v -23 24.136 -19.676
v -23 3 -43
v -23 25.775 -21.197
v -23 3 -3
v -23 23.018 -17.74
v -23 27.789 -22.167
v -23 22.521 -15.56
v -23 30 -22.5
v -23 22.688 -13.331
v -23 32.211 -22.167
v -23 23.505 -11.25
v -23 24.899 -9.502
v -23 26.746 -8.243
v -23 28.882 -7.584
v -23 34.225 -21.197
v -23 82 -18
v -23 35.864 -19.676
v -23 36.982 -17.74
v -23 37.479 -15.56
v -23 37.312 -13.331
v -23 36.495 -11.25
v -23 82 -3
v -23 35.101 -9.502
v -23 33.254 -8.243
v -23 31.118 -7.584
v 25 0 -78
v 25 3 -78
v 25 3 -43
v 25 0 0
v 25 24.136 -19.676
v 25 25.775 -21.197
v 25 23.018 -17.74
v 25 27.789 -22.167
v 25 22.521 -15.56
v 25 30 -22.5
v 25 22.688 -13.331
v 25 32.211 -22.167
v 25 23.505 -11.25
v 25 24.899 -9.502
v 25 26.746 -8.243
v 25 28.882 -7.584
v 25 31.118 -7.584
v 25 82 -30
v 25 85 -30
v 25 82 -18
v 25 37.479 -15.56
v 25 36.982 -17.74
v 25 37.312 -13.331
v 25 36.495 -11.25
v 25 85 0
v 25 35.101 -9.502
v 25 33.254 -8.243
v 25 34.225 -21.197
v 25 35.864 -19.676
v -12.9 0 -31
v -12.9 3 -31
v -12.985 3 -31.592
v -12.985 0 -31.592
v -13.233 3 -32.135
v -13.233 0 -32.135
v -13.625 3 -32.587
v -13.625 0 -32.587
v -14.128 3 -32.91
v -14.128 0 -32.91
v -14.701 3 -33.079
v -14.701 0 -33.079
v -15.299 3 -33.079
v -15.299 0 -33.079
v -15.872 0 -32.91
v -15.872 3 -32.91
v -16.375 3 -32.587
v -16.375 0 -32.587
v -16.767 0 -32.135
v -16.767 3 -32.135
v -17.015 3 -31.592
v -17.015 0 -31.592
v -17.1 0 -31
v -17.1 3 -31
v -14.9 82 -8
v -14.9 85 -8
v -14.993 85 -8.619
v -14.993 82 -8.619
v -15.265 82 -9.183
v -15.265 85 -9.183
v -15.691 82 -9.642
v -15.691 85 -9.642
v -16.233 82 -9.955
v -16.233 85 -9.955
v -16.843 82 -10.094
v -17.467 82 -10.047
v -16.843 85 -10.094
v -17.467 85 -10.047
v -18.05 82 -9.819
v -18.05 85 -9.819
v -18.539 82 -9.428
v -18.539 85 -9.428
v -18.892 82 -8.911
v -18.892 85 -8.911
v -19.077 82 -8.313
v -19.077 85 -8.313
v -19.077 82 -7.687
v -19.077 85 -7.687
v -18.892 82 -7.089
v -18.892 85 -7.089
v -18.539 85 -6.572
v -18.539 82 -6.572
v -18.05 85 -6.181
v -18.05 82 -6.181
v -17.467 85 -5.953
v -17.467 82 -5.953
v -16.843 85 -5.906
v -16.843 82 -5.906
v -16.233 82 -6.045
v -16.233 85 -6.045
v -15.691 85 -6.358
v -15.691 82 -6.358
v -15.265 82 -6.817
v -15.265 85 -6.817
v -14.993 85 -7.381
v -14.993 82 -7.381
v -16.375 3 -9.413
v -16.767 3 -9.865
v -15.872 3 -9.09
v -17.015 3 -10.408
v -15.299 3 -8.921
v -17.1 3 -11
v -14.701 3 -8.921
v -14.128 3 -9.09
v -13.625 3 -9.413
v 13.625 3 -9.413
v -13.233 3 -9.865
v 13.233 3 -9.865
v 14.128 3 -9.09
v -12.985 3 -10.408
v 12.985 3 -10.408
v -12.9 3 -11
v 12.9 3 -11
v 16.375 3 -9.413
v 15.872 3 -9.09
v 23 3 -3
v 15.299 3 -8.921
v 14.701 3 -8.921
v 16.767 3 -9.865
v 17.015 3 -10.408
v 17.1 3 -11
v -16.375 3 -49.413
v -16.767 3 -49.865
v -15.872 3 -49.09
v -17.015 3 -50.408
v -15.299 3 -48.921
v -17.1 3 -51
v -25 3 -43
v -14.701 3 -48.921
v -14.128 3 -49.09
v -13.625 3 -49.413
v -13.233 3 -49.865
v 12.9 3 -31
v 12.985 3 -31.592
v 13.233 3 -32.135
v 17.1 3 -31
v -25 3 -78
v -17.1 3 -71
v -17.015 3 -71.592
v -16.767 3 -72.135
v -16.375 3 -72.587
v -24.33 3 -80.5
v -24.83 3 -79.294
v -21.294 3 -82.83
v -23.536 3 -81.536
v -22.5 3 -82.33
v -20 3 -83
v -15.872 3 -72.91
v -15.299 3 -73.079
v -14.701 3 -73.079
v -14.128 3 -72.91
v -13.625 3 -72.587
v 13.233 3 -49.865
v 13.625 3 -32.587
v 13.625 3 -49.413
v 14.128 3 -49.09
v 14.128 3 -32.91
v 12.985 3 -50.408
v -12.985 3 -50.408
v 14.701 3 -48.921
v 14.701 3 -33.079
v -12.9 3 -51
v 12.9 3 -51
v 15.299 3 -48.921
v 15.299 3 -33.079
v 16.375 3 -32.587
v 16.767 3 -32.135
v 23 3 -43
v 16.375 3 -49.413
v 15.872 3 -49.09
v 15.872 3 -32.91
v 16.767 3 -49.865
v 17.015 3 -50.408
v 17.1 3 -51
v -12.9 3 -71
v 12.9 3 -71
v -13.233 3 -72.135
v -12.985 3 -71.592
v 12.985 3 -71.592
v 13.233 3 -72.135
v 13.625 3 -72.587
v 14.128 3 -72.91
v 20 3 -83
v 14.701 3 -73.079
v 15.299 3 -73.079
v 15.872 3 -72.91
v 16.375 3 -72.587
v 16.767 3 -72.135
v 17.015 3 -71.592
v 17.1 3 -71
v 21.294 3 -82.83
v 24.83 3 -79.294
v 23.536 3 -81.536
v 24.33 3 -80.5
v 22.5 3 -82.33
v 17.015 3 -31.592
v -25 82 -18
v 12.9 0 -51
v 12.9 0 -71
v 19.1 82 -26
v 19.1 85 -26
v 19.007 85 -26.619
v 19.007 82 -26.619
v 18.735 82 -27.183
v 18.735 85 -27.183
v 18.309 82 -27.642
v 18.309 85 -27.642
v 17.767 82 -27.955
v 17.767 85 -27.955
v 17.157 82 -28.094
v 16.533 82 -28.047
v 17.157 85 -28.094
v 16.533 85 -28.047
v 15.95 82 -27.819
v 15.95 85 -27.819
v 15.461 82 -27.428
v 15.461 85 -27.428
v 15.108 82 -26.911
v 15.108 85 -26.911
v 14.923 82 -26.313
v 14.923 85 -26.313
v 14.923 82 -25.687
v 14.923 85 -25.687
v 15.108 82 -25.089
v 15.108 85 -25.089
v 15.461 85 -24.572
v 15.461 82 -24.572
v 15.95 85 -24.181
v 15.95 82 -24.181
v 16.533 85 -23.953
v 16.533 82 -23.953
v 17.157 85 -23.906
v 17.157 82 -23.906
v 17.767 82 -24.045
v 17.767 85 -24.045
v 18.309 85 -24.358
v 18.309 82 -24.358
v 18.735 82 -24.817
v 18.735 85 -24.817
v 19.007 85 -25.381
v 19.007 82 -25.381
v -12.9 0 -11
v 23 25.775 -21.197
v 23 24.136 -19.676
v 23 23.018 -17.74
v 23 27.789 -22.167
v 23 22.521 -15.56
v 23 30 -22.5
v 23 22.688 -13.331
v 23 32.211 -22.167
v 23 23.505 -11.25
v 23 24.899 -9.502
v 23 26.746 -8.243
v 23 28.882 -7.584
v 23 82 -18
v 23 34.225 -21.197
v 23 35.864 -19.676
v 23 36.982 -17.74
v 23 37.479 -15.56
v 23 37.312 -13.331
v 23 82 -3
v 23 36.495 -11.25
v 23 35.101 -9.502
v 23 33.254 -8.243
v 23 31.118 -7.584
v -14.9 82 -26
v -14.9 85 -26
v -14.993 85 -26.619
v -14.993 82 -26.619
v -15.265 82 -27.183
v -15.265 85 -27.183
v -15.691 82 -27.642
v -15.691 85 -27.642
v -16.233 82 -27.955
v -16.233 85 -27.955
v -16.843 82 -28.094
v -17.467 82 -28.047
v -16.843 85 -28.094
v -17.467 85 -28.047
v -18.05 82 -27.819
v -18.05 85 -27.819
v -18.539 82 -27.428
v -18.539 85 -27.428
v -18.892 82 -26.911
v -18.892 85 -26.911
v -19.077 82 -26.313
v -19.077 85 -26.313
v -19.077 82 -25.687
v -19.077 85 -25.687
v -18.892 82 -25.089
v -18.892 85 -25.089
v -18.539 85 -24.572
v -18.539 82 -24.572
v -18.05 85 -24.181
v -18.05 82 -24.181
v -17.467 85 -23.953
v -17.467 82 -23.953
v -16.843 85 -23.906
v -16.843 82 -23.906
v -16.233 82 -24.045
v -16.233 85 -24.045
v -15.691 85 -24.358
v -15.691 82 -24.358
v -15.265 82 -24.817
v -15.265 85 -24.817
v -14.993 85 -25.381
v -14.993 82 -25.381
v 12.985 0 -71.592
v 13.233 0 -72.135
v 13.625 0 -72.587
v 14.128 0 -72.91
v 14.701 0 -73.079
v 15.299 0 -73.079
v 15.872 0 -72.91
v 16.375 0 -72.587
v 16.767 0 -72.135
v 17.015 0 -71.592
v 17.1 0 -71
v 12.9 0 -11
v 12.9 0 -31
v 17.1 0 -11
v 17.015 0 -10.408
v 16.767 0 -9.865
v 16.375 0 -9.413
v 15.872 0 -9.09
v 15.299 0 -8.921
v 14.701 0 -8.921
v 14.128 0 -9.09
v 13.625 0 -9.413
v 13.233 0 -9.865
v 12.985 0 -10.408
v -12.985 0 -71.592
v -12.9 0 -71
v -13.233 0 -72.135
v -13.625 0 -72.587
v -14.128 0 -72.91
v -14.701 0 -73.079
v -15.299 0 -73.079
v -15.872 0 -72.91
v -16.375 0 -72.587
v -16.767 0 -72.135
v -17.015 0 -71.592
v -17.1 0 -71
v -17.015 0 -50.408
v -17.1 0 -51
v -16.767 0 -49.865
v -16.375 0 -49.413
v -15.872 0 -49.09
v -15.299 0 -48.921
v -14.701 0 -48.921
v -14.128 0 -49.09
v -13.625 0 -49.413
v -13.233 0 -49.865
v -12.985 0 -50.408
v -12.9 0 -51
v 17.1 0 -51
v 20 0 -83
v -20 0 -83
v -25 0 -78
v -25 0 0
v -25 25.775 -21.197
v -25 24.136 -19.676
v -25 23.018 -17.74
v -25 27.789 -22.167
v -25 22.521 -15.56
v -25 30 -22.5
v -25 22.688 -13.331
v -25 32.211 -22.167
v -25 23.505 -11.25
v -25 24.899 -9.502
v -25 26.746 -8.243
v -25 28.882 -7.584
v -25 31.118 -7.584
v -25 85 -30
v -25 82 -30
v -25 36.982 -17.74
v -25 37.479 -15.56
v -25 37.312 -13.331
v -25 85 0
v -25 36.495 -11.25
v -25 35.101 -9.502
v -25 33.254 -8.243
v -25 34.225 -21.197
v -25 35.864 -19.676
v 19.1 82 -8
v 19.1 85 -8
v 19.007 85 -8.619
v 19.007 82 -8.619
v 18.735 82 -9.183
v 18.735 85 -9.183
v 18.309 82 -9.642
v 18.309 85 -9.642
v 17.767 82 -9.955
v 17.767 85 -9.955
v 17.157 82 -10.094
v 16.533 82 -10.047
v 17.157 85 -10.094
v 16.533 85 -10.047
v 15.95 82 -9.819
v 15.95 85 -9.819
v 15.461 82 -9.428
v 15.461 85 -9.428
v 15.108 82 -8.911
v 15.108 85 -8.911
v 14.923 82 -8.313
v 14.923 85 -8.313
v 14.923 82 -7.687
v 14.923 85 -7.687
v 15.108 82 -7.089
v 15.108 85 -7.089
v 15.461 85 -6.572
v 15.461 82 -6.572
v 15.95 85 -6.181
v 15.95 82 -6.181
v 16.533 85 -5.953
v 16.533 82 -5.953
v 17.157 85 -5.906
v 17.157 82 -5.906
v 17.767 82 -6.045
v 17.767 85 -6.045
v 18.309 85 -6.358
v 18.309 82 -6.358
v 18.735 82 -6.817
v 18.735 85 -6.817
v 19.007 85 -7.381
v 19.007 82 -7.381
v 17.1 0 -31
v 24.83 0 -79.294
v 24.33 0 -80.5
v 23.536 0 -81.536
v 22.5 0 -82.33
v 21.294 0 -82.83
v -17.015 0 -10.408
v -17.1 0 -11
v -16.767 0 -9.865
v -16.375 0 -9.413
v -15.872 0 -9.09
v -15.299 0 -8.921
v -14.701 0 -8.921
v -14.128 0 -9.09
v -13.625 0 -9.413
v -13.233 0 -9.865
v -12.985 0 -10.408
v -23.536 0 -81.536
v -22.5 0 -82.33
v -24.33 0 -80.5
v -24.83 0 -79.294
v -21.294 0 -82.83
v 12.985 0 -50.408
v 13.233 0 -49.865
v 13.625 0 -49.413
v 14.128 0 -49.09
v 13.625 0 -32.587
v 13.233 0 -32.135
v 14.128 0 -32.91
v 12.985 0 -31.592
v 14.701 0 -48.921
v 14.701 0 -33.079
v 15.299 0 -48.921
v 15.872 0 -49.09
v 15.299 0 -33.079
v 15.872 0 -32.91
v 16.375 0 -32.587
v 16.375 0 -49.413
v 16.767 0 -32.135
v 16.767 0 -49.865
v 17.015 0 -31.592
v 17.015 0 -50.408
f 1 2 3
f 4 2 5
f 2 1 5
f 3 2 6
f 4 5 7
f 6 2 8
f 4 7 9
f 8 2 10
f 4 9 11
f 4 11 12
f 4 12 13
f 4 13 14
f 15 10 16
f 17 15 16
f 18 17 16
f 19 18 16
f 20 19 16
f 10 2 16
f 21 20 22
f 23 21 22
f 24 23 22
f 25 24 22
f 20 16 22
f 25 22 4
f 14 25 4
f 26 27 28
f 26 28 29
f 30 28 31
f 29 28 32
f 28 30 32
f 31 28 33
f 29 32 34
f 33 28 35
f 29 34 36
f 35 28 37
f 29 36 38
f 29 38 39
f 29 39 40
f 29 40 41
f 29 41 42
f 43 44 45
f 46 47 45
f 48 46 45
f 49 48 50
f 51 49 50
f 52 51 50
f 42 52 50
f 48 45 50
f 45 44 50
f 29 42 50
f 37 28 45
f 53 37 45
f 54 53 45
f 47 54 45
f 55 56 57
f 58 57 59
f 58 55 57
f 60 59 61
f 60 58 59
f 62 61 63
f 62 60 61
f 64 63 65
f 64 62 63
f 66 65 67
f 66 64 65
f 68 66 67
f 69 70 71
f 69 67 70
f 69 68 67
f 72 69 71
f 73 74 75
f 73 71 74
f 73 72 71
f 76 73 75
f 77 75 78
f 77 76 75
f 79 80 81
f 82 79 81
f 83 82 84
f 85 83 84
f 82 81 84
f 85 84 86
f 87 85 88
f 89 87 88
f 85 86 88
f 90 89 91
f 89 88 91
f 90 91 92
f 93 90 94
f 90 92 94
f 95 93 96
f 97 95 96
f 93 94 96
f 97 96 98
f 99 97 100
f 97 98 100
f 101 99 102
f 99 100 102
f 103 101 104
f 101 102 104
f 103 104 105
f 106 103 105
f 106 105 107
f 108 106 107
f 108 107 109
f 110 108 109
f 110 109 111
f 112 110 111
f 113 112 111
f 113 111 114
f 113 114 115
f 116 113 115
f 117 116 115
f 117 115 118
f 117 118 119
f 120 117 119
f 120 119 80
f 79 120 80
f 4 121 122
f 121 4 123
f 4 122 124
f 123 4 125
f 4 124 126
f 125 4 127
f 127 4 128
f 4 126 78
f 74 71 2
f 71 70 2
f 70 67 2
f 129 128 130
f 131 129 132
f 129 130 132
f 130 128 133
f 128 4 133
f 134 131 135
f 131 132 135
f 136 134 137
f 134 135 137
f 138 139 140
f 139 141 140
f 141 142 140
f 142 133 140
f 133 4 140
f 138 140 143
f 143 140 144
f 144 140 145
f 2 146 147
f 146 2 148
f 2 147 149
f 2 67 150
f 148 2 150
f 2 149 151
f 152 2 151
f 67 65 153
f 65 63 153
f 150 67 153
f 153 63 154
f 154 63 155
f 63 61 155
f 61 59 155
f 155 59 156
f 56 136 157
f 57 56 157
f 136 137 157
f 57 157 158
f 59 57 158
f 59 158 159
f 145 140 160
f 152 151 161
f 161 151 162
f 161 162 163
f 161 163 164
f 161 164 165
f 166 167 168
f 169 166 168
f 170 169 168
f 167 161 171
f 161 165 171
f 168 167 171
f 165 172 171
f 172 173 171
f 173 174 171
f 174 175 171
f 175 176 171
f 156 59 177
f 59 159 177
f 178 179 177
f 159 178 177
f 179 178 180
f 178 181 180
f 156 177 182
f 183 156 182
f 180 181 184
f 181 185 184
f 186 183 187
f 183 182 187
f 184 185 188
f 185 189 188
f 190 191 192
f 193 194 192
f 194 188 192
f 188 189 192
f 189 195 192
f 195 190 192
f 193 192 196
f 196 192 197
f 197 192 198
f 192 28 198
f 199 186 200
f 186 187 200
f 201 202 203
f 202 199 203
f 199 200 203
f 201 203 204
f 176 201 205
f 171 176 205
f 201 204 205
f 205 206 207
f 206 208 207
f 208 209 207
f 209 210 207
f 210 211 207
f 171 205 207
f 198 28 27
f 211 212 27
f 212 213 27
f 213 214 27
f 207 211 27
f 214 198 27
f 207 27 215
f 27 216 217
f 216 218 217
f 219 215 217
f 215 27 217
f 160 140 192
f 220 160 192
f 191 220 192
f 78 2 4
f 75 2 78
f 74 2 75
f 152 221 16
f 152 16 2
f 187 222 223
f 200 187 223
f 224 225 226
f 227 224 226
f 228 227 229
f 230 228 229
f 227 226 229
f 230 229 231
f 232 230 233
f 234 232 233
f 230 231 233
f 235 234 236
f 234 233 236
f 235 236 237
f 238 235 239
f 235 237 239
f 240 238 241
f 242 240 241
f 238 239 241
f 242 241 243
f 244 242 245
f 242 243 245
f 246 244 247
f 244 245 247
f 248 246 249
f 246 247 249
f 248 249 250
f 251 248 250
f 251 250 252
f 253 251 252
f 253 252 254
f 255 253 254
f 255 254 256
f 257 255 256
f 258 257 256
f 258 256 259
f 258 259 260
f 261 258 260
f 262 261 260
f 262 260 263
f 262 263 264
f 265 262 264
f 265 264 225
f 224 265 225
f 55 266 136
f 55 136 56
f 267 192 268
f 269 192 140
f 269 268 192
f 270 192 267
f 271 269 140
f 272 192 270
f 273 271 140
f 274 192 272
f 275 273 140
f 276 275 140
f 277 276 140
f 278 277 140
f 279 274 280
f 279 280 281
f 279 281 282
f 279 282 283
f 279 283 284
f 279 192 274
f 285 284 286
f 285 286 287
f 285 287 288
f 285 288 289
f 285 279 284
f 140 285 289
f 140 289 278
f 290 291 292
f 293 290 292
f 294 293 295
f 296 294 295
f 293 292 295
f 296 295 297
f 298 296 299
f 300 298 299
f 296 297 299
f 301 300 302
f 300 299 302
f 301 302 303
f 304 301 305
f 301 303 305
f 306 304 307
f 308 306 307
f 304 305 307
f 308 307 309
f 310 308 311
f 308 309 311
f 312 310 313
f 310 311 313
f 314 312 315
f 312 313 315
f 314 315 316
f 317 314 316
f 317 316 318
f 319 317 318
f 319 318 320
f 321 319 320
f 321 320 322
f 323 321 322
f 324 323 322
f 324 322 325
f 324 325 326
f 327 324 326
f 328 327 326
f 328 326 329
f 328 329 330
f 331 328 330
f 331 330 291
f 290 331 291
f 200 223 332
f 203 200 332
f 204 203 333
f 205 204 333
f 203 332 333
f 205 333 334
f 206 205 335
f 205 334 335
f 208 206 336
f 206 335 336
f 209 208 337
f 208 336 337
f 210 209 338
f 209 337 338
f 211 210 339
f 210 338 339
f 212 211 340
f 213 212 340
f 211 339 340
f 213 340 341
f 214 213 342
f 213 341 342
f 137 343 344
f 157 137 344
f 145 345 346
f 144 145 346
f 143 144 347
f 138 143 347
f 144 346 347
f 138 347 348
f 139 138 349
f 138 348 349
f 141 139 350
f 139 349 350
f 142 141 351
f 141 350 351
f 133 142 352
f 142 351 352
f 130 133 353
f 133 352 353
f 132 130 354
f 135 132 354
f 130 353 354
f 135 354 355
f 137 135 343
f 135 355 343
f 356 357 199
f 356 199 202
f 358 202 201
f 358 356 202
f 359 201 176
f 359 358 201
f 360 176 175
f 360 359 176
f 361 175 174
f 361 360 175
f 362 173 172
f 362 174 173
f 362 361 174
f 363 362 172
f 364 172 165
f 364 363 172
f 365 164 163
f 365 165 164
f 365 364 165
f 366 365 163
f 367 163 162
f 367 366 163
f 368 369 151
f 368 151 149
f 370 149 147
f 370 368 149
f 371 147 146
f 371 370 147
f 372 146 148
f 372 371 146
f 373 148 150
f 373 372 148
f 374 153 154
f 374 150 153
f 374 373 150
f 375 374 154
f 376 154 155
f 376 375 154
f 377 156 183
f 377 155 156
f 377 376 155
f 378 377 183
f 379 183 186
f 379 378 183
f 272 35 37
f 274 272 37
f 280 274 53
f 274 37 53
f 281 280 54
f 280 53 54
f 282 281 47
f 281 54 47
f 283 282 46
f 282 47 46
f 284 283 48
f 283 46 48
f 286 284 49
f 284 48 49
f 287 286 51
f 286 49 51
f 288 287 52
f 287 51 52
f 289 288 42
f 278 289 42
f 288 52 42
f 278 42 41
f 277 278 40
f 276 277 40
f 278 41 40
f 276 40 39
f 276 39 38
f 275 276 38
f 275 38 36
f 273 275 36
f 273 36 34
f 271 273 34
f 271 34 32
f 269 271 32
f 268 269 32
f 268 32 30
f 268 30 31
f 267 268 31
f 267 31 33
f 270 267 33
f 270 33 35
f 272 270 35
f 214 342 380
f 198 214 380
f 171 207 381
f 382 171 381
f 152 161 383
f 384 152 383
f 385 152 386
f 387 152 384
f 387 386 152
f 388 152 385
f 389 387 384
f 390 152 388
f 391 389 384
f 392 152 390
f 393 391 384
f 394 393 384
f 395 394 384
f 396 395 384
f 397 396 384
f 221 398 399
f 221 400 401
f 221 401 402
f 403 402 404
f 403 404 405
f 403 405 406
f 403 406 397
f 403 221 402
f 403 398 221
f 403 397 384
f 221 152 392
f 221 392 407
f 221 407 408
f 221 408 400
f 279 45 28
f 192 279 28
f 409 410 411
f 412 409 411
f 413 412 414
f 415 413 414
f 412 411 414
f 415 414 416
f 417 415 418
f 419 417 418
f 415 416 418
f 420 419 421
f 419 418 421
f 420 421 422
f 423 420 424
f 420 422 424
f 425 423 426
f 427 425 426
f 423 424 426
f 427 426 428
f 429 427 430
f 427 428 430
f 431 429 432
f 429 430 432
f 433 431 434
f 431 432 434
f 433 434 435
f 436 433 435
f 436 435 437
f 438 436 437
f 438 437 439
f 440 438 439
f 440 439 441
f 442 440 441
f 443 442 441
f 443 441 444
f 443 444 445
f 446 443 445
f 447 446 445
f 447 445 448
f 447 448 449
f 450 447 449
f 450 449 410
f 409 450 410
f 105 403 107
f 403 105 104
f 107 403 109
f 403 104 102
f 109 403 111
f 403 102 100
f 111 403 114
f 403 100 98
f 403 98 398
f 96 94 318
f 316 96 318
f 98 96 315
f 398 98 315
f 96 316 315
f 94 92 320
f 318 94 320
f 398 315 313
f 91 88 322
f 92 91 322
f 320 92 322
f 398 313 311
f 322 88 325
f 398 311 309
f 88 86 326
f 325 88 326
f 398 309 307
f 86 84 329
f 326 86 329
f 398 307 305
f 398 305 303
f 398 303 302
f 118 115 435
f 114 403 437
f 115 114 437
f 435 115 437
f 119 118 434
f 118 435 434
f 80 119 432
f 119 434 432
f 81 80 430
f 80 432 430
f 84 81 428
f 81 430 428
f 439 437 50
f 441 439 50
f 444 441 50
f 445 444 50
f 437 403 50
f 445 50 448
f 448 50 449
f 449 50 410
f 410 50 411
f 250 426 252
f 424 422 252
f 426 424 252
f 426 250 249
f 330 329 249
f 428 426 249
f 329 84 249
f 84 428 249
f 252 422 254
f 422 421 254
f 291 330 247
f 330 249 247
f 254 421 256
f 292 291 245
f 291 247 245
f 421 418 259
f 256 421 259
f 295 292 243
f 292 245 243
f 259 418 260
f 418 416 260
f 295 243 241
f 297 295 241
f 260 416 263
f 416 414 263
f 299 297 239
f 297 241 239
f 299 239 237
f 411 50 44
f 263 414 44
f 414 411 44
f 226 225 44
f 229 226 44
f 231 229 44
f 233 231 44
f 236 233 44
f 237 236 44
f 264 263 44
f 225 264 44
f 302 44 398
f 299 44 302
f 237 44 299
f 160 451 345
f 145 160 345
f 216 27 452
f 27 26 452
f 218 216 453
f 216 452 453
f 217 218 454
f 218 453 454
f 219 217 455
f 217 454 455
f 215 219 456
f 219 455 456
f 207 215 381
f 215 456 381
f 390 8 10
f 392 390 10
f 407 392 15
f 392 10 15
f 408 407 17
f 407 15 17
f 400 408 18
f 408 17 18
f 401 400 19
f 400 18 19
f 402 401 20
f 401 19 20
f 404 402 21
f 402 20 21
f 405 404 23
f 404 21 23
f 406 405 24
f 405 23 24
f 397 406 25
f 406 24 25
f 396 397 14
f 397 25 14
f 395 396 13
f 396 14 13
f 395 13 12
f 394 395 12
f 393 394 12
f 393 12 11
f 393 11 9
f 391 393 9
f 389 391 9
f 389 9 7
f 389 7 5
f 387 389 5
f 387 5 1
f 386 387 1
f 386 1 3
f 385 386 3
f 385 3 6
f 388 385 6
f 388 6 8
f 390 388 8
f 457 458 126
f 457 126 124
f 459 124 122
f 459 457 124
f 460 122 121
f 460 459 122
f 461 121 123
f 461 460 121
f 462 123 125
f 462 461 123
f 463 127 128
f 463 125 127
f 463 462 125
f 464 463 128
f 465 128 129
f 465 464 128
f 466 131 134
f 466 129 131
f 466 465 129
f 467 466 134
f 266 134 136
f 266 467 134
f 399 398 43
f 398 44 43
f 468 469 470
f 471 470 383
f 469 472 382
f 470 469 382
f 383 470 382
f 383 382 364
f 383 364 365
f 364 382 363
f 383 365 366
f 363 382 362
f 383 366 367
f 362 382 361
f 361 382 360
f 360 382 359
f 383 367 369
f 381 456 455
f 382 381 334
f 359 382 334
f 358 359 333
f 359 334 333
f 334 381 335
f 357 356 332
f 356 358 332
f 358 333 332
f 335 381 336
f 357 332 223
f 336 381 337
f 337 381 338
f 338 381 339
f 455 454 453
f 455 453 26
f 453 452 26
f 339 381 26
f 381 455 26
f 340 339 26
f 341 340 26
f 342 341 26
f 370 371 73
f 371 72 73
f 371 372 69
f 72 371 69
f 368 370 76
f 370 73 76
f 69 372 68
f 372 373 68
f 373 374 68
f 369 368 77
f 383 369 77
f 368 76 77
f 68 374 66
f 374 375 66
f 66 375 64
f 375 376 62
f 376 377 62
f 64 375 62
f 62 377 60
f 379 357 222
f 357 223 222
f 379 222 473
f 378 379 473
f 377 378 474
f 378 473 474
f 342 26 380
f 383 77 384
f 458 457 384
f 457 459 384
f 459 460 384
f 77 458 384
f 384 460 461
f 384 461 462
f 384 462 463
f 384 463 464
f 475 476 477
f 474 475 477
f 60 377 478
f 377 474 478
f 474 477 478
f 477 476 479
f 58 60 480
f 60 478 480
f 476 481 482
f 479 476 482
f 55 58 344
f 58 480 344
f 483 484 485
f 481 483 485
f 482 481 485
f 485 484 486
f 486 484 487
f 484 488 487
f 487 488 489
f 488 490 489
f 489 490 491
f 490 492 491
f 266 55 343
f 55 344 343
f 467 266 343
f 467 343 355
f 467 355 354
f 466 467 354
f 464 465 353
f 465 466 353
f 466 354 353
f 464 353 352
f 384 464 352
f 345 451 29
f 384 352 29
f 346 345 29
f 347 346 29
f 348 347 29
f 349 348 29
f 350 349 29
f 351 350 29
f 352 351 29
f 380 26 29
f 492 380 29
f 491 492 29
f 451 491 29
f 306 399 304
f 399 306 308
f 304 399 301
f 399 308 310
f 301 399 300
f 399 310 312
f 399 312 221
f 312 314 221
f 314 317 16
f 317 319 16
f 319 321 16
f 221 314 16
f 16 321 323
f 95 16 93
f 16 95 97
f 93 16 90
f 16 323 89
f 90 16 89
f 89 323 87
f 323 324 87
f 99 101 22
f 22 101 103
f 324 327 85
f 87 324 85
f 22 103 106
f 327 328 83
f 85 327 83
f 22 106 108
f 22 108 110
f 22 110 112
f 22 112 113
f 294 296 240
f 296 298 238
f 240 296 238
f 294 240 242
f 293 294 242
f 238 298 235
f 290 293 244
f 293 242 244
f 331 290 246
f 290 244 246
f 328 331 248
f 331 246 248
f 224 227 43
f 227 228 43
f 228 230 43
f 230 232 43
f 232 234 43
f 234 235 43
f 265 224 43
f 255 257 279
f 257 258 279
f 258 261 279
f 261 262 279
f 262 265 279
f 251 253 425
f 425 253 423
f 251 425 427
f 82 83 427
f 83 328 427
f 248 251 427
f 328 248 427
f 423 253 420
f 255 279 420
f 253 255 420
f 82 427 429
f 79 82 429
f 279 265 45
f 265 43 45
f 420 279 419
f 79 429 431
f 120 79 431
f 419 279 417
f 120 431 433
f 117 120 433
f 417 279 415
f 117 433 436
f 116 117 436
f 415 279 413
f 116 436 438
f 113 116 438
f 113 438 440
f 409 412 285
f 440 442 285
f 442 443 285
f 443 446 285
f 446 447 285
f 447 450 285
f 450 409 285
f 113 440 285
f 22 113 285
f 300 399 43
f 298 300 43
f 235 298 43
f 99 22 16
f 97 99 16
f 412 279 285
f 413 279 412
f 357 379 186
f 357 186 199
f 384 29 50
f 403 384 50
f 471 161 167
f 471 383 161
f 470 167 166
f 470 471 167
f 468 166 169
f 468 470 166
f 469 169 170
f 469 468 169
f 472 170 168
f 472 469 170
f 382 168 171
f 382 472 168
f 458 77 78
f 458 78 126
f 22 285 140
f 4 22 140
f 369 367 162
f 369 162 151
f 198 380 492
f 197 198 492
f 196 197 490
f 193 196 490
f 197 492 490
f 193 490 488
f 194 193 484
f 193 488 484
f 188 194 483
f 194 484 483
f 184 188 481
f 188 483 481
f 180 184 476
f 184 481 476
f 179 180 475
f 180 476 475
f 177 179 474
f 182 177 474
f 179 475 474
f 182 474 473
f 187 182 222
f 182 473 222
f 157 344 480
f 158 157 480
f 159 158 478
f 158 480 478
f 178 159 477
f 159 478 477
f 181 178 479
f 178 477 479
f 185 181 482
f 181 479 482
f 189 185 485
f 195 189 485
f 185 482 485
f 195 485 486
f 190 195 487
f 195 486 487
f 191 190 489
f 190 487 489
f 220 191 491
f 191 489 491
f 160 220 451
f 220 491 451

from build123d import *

# Parameters (mm, degrees)
EXTRUDE_1_DEPTH     = 25
EXTRUDE_2_DEPTH     = 2
CUT_EXTRUDE_1_REACH = 87
SKETCH_4_R          = 2.1
CUT_EXTRUDE_2_REACH = 87
FILLET_1_R          = 5
EXTRUDE_3_DEPTH     = 2
SKETCH_7_R          = 7.5
CUT_EXTRUDE_3_DEPTH = 51


with BuildPart() as part:
    # 草图1 → 凸台-拉伸1 (new body, symmetric)
    with BuildSketch(Plane(origin=(0, 0, 0), x_dir=(0, 0, -1), z_dir=(1, 0, 0))):
        Polygon((0, 0), (0, 85), (30, 85), (30, 82), (3, 82), (3, 3), (83, 3), (83, 0), align=None)
    extrude(amount=EXTRUDE_1_DEPTH, both=True)

    # 草图2 → 凸台-拉伸2 (add)
    with BuildSketch(Plane(origin=(25, 0, 0), x_dir=(0, 0, -1), z_dir=(1, 0, 0))):
        Polygon((43, 3), (3, 3), (3, 82), (18, 82), align=None)
    extrude(amount=-EXTRUDE_2_DEPTH)

    # 草图4 → 切除-拉伸1 (cut, up to next)
    with BuildSketch(Plane(origin=(0, 85, 0), x_dir=(1, 0, 0), z_dir=(0, 1, 0)), mode=Mode.PRIVATE) as cut_extrude_1_sk1:
        with Locations((-17, 26)):
            Circle(SKETCH_4_R)
    cut_extrude_1_tool1 = extrude(cut_extrude_1_sk1.sketch, amount=-CUT_EXTRUDE_1_REACH, mode=Mode.PRIVATE) & part.part
    add(cut_extrude_1_tool1.solids().sort_by_distance((-17, 85, -26))[0], mode=Mode.SUBTRACT)
    # 草图4 → 切除-拉伸1 (cut, up to next)
    with BuildSketch(Plane(origin=(0, 85, 0), x_dir=(1, 0, 0), z_dir=(0, 1, 0)), mode=Mode.PRIVATE) as cut_extrude_1_sk2:
        with Locations((-17, 8)):
            Circle(SKETCH_4_R)
    cut_extrude_1_tool2 = extrude(cut_extrude_1_sk2.sketch, amount=-CUT_EXTRUDE_1_REACH, mode=Mode.PRIVATE) & part.part
    add(cut_extrude_1_tool2.solids().sort_by_distance((-17, 85, -8))[0], mode=Mode.SUBTRACT)
    # 草图4 → 切除-拉伸1 (cut, up to next)
    with BuildSketch(Plane(origin=(0, 85, 0), x_dir=(1, 0, 0), z_dir=(0, 1, 0)), mode=Mode.PRIVATE) as cut_extrude_1_sk3:
        with Locations((17, 8)):
            Circle(SKETCH_4_R)
    cut_extrude_1_tool3 = extrude(cut_extrude_1_sk3.sketch, amount=-CUT_EXTRUDE_1_REACH, mode=Mode.PRIVATE) & part.part
    add(cut_extrude_1_tool3.solids().sort_by_distance((17, 85, -8))[0], mode=Mode.SUBTRACT)
    # 草图4 → 切除-拉伸1 (cut, up to next)
    with BuildSketch(Plane(origin=(0, 85, 0), x_dir=(1, 0, 0), z_dir=(0, 1, 0)), mode=Mode.PRIVATE) as cut_extrude_1_sk4:
        with Locations((17, 26)):
            Circle(SKETCH_4_R)
    cut_extrude_1_tool4 = extrude(cut_extrude_1_sk4.sketch, amount=-CUT_EXTRUDE_1_REACH, mode=Mode.PRIVATE) & part.part
    add(cut_extrude_1_tool4.solids().sort_by_distance((17, 85, -26))[0], mode=Mode.SUBTRACT)

    # 草图5 → 切除-拉伸2 (cut, up to next)
    with BuildSketch(Plane.XZ, mode=Mode.PRIVATE) as cut_extrude_2_sk1:
        with BuildLine():
            Line((-12.9, -11), (-12.9, -31))
            ThreePointArc((-12.9, -31), (-15, -33.1), (-17.1, -31))
            Line((-17.1, -31), (-17.1, -11))
            ThreePointArc((-17.1, -11), (-15, -8.9), (-12.9, -11))
        make_face()
    cut_extrude_2_tool1 = extrude(cut_extrude_2_sk1.sketch, amount=-CUT_EXTRUDE_2_REACH, mode=Mode.PRIVATE) & part.part
    add(cut_extrude_2_tool1.solids().sort_by_distance((-15, 0, -21))[0], mode=Mode.SUBTRACT)
    # 草图5 → 切除-拉伸2 (cut, up to next)
    with BuildSketch(Plane.XZ, mode=Mode.PRIVATE) as cut_extrude_2_sk2:
        with BuildLine():
            Line((-12.9, -51), (-12.9, -71))
            ThreePointArc((-12.9, -71), (-15, -73.1), (-17.1, -71))
            Line((-17.1, -71), (-17.1, -51))
            ThreePointArc((-17.1, -51), (-15, -48.9), (-12.9, -51))
        make_face()
    cut_extrude_2_tool2 = extrude(cut_extrude_2_sk2.sketch, amount=-CUT_EXTRUDE_2_REACH, mode=Mode.PRIVATE) & part.part
    add(cut_extrude_2_tool2.solids().sort_by_distance((-15, 0, -61))[0], mode=Mode.SUBTRACT)
    # 草图5 → 切除-拉伸2 (cut, up to next)
    with BuildSketch(Plane.XZ, mode=Mode.PRIVATE) as cut_extrude_2_sk3:
        with BuildLine():
            Line((12.9, -51), (12.9, -71))
            ThreePointArc((12.9, -71), (15, -73.1), (17.1, -71))
            Line((17.1, -71), (17.1, -51))
            ThreePointArc((17.1, -51), (15, -48.9), (12.9, -51))
        make_face()
    cut_extrude_2_tool3 = extrude(cut_extrude_2_sk3.sketch, amount=-CUT_EXTRUDE_2_REACH, mode=Mode.PRIVATE) & part.part
    add(cut_extrude_2_tool3.solids().sort_by_distance((15, 0, -61))[0], mode=Mode.SUBTRACT)
    # 草图5 → 切除-拉伸2 (cut, up to next)
    with BuildSketch(Plane.XZ, mode=Mode.PRIVATE) as cut_extrude_2_sk4:
        with BuildLine():
            Line((12.9, -11), (12.9, -31))
            ThreePointArc((12.9, -31), (15, -33.1), (17.1, -31))
            Line((17.1, -31), (17.1, -11))
            ThreePointArc((17.1, -11), (15, -8.9), (12.9, -11))
        make_face()
    cut_extrude_2_tool4 = extrude(cut_extrude_2_sk4.sketch, amount=-CUT_EXTRUDE_2_REACH, mode=Mode.PRIVATE) & part.part
    add(cut_extrude_2_tool4.solids().sort_by_distance((15, 0, -21))[0], mode=Mode.SUBTRACT)

    # 圆角1
    fillet_1_edges = [part.edges().sort_by_distance(p)[0] for p in [
        (-25, 1.5, -83),
        (25, 1.5, -83),
    ]]
    fillet(fillet_1_edges, radius=FILLET_1_R)

    # 草图6 → 凸台-拉伸3 (add)
    with BuildSketch(Plane.ZY.offset(25)):
        Polygon((-43, 3), (-3, 3), (-3, 82), (-18, 82), align=None)
    extrude(amount=-EXTRUDE_3_DEPTH)

    # 草图7 → 切除-拉伸3 (cut, through all)
    with BuildSketch(Plane(origin=(25, 0, 0), x_dir=(0, 0, -1), z_dir=(1, 0, 0))):
        with Locations((15, 30)):
            Circle(SKETCH_7_R)
    extrude(amount=-CUT_EXTRUDE_3_DEPTH, mode=Mode.SUBTRACT)


solid = part.part
